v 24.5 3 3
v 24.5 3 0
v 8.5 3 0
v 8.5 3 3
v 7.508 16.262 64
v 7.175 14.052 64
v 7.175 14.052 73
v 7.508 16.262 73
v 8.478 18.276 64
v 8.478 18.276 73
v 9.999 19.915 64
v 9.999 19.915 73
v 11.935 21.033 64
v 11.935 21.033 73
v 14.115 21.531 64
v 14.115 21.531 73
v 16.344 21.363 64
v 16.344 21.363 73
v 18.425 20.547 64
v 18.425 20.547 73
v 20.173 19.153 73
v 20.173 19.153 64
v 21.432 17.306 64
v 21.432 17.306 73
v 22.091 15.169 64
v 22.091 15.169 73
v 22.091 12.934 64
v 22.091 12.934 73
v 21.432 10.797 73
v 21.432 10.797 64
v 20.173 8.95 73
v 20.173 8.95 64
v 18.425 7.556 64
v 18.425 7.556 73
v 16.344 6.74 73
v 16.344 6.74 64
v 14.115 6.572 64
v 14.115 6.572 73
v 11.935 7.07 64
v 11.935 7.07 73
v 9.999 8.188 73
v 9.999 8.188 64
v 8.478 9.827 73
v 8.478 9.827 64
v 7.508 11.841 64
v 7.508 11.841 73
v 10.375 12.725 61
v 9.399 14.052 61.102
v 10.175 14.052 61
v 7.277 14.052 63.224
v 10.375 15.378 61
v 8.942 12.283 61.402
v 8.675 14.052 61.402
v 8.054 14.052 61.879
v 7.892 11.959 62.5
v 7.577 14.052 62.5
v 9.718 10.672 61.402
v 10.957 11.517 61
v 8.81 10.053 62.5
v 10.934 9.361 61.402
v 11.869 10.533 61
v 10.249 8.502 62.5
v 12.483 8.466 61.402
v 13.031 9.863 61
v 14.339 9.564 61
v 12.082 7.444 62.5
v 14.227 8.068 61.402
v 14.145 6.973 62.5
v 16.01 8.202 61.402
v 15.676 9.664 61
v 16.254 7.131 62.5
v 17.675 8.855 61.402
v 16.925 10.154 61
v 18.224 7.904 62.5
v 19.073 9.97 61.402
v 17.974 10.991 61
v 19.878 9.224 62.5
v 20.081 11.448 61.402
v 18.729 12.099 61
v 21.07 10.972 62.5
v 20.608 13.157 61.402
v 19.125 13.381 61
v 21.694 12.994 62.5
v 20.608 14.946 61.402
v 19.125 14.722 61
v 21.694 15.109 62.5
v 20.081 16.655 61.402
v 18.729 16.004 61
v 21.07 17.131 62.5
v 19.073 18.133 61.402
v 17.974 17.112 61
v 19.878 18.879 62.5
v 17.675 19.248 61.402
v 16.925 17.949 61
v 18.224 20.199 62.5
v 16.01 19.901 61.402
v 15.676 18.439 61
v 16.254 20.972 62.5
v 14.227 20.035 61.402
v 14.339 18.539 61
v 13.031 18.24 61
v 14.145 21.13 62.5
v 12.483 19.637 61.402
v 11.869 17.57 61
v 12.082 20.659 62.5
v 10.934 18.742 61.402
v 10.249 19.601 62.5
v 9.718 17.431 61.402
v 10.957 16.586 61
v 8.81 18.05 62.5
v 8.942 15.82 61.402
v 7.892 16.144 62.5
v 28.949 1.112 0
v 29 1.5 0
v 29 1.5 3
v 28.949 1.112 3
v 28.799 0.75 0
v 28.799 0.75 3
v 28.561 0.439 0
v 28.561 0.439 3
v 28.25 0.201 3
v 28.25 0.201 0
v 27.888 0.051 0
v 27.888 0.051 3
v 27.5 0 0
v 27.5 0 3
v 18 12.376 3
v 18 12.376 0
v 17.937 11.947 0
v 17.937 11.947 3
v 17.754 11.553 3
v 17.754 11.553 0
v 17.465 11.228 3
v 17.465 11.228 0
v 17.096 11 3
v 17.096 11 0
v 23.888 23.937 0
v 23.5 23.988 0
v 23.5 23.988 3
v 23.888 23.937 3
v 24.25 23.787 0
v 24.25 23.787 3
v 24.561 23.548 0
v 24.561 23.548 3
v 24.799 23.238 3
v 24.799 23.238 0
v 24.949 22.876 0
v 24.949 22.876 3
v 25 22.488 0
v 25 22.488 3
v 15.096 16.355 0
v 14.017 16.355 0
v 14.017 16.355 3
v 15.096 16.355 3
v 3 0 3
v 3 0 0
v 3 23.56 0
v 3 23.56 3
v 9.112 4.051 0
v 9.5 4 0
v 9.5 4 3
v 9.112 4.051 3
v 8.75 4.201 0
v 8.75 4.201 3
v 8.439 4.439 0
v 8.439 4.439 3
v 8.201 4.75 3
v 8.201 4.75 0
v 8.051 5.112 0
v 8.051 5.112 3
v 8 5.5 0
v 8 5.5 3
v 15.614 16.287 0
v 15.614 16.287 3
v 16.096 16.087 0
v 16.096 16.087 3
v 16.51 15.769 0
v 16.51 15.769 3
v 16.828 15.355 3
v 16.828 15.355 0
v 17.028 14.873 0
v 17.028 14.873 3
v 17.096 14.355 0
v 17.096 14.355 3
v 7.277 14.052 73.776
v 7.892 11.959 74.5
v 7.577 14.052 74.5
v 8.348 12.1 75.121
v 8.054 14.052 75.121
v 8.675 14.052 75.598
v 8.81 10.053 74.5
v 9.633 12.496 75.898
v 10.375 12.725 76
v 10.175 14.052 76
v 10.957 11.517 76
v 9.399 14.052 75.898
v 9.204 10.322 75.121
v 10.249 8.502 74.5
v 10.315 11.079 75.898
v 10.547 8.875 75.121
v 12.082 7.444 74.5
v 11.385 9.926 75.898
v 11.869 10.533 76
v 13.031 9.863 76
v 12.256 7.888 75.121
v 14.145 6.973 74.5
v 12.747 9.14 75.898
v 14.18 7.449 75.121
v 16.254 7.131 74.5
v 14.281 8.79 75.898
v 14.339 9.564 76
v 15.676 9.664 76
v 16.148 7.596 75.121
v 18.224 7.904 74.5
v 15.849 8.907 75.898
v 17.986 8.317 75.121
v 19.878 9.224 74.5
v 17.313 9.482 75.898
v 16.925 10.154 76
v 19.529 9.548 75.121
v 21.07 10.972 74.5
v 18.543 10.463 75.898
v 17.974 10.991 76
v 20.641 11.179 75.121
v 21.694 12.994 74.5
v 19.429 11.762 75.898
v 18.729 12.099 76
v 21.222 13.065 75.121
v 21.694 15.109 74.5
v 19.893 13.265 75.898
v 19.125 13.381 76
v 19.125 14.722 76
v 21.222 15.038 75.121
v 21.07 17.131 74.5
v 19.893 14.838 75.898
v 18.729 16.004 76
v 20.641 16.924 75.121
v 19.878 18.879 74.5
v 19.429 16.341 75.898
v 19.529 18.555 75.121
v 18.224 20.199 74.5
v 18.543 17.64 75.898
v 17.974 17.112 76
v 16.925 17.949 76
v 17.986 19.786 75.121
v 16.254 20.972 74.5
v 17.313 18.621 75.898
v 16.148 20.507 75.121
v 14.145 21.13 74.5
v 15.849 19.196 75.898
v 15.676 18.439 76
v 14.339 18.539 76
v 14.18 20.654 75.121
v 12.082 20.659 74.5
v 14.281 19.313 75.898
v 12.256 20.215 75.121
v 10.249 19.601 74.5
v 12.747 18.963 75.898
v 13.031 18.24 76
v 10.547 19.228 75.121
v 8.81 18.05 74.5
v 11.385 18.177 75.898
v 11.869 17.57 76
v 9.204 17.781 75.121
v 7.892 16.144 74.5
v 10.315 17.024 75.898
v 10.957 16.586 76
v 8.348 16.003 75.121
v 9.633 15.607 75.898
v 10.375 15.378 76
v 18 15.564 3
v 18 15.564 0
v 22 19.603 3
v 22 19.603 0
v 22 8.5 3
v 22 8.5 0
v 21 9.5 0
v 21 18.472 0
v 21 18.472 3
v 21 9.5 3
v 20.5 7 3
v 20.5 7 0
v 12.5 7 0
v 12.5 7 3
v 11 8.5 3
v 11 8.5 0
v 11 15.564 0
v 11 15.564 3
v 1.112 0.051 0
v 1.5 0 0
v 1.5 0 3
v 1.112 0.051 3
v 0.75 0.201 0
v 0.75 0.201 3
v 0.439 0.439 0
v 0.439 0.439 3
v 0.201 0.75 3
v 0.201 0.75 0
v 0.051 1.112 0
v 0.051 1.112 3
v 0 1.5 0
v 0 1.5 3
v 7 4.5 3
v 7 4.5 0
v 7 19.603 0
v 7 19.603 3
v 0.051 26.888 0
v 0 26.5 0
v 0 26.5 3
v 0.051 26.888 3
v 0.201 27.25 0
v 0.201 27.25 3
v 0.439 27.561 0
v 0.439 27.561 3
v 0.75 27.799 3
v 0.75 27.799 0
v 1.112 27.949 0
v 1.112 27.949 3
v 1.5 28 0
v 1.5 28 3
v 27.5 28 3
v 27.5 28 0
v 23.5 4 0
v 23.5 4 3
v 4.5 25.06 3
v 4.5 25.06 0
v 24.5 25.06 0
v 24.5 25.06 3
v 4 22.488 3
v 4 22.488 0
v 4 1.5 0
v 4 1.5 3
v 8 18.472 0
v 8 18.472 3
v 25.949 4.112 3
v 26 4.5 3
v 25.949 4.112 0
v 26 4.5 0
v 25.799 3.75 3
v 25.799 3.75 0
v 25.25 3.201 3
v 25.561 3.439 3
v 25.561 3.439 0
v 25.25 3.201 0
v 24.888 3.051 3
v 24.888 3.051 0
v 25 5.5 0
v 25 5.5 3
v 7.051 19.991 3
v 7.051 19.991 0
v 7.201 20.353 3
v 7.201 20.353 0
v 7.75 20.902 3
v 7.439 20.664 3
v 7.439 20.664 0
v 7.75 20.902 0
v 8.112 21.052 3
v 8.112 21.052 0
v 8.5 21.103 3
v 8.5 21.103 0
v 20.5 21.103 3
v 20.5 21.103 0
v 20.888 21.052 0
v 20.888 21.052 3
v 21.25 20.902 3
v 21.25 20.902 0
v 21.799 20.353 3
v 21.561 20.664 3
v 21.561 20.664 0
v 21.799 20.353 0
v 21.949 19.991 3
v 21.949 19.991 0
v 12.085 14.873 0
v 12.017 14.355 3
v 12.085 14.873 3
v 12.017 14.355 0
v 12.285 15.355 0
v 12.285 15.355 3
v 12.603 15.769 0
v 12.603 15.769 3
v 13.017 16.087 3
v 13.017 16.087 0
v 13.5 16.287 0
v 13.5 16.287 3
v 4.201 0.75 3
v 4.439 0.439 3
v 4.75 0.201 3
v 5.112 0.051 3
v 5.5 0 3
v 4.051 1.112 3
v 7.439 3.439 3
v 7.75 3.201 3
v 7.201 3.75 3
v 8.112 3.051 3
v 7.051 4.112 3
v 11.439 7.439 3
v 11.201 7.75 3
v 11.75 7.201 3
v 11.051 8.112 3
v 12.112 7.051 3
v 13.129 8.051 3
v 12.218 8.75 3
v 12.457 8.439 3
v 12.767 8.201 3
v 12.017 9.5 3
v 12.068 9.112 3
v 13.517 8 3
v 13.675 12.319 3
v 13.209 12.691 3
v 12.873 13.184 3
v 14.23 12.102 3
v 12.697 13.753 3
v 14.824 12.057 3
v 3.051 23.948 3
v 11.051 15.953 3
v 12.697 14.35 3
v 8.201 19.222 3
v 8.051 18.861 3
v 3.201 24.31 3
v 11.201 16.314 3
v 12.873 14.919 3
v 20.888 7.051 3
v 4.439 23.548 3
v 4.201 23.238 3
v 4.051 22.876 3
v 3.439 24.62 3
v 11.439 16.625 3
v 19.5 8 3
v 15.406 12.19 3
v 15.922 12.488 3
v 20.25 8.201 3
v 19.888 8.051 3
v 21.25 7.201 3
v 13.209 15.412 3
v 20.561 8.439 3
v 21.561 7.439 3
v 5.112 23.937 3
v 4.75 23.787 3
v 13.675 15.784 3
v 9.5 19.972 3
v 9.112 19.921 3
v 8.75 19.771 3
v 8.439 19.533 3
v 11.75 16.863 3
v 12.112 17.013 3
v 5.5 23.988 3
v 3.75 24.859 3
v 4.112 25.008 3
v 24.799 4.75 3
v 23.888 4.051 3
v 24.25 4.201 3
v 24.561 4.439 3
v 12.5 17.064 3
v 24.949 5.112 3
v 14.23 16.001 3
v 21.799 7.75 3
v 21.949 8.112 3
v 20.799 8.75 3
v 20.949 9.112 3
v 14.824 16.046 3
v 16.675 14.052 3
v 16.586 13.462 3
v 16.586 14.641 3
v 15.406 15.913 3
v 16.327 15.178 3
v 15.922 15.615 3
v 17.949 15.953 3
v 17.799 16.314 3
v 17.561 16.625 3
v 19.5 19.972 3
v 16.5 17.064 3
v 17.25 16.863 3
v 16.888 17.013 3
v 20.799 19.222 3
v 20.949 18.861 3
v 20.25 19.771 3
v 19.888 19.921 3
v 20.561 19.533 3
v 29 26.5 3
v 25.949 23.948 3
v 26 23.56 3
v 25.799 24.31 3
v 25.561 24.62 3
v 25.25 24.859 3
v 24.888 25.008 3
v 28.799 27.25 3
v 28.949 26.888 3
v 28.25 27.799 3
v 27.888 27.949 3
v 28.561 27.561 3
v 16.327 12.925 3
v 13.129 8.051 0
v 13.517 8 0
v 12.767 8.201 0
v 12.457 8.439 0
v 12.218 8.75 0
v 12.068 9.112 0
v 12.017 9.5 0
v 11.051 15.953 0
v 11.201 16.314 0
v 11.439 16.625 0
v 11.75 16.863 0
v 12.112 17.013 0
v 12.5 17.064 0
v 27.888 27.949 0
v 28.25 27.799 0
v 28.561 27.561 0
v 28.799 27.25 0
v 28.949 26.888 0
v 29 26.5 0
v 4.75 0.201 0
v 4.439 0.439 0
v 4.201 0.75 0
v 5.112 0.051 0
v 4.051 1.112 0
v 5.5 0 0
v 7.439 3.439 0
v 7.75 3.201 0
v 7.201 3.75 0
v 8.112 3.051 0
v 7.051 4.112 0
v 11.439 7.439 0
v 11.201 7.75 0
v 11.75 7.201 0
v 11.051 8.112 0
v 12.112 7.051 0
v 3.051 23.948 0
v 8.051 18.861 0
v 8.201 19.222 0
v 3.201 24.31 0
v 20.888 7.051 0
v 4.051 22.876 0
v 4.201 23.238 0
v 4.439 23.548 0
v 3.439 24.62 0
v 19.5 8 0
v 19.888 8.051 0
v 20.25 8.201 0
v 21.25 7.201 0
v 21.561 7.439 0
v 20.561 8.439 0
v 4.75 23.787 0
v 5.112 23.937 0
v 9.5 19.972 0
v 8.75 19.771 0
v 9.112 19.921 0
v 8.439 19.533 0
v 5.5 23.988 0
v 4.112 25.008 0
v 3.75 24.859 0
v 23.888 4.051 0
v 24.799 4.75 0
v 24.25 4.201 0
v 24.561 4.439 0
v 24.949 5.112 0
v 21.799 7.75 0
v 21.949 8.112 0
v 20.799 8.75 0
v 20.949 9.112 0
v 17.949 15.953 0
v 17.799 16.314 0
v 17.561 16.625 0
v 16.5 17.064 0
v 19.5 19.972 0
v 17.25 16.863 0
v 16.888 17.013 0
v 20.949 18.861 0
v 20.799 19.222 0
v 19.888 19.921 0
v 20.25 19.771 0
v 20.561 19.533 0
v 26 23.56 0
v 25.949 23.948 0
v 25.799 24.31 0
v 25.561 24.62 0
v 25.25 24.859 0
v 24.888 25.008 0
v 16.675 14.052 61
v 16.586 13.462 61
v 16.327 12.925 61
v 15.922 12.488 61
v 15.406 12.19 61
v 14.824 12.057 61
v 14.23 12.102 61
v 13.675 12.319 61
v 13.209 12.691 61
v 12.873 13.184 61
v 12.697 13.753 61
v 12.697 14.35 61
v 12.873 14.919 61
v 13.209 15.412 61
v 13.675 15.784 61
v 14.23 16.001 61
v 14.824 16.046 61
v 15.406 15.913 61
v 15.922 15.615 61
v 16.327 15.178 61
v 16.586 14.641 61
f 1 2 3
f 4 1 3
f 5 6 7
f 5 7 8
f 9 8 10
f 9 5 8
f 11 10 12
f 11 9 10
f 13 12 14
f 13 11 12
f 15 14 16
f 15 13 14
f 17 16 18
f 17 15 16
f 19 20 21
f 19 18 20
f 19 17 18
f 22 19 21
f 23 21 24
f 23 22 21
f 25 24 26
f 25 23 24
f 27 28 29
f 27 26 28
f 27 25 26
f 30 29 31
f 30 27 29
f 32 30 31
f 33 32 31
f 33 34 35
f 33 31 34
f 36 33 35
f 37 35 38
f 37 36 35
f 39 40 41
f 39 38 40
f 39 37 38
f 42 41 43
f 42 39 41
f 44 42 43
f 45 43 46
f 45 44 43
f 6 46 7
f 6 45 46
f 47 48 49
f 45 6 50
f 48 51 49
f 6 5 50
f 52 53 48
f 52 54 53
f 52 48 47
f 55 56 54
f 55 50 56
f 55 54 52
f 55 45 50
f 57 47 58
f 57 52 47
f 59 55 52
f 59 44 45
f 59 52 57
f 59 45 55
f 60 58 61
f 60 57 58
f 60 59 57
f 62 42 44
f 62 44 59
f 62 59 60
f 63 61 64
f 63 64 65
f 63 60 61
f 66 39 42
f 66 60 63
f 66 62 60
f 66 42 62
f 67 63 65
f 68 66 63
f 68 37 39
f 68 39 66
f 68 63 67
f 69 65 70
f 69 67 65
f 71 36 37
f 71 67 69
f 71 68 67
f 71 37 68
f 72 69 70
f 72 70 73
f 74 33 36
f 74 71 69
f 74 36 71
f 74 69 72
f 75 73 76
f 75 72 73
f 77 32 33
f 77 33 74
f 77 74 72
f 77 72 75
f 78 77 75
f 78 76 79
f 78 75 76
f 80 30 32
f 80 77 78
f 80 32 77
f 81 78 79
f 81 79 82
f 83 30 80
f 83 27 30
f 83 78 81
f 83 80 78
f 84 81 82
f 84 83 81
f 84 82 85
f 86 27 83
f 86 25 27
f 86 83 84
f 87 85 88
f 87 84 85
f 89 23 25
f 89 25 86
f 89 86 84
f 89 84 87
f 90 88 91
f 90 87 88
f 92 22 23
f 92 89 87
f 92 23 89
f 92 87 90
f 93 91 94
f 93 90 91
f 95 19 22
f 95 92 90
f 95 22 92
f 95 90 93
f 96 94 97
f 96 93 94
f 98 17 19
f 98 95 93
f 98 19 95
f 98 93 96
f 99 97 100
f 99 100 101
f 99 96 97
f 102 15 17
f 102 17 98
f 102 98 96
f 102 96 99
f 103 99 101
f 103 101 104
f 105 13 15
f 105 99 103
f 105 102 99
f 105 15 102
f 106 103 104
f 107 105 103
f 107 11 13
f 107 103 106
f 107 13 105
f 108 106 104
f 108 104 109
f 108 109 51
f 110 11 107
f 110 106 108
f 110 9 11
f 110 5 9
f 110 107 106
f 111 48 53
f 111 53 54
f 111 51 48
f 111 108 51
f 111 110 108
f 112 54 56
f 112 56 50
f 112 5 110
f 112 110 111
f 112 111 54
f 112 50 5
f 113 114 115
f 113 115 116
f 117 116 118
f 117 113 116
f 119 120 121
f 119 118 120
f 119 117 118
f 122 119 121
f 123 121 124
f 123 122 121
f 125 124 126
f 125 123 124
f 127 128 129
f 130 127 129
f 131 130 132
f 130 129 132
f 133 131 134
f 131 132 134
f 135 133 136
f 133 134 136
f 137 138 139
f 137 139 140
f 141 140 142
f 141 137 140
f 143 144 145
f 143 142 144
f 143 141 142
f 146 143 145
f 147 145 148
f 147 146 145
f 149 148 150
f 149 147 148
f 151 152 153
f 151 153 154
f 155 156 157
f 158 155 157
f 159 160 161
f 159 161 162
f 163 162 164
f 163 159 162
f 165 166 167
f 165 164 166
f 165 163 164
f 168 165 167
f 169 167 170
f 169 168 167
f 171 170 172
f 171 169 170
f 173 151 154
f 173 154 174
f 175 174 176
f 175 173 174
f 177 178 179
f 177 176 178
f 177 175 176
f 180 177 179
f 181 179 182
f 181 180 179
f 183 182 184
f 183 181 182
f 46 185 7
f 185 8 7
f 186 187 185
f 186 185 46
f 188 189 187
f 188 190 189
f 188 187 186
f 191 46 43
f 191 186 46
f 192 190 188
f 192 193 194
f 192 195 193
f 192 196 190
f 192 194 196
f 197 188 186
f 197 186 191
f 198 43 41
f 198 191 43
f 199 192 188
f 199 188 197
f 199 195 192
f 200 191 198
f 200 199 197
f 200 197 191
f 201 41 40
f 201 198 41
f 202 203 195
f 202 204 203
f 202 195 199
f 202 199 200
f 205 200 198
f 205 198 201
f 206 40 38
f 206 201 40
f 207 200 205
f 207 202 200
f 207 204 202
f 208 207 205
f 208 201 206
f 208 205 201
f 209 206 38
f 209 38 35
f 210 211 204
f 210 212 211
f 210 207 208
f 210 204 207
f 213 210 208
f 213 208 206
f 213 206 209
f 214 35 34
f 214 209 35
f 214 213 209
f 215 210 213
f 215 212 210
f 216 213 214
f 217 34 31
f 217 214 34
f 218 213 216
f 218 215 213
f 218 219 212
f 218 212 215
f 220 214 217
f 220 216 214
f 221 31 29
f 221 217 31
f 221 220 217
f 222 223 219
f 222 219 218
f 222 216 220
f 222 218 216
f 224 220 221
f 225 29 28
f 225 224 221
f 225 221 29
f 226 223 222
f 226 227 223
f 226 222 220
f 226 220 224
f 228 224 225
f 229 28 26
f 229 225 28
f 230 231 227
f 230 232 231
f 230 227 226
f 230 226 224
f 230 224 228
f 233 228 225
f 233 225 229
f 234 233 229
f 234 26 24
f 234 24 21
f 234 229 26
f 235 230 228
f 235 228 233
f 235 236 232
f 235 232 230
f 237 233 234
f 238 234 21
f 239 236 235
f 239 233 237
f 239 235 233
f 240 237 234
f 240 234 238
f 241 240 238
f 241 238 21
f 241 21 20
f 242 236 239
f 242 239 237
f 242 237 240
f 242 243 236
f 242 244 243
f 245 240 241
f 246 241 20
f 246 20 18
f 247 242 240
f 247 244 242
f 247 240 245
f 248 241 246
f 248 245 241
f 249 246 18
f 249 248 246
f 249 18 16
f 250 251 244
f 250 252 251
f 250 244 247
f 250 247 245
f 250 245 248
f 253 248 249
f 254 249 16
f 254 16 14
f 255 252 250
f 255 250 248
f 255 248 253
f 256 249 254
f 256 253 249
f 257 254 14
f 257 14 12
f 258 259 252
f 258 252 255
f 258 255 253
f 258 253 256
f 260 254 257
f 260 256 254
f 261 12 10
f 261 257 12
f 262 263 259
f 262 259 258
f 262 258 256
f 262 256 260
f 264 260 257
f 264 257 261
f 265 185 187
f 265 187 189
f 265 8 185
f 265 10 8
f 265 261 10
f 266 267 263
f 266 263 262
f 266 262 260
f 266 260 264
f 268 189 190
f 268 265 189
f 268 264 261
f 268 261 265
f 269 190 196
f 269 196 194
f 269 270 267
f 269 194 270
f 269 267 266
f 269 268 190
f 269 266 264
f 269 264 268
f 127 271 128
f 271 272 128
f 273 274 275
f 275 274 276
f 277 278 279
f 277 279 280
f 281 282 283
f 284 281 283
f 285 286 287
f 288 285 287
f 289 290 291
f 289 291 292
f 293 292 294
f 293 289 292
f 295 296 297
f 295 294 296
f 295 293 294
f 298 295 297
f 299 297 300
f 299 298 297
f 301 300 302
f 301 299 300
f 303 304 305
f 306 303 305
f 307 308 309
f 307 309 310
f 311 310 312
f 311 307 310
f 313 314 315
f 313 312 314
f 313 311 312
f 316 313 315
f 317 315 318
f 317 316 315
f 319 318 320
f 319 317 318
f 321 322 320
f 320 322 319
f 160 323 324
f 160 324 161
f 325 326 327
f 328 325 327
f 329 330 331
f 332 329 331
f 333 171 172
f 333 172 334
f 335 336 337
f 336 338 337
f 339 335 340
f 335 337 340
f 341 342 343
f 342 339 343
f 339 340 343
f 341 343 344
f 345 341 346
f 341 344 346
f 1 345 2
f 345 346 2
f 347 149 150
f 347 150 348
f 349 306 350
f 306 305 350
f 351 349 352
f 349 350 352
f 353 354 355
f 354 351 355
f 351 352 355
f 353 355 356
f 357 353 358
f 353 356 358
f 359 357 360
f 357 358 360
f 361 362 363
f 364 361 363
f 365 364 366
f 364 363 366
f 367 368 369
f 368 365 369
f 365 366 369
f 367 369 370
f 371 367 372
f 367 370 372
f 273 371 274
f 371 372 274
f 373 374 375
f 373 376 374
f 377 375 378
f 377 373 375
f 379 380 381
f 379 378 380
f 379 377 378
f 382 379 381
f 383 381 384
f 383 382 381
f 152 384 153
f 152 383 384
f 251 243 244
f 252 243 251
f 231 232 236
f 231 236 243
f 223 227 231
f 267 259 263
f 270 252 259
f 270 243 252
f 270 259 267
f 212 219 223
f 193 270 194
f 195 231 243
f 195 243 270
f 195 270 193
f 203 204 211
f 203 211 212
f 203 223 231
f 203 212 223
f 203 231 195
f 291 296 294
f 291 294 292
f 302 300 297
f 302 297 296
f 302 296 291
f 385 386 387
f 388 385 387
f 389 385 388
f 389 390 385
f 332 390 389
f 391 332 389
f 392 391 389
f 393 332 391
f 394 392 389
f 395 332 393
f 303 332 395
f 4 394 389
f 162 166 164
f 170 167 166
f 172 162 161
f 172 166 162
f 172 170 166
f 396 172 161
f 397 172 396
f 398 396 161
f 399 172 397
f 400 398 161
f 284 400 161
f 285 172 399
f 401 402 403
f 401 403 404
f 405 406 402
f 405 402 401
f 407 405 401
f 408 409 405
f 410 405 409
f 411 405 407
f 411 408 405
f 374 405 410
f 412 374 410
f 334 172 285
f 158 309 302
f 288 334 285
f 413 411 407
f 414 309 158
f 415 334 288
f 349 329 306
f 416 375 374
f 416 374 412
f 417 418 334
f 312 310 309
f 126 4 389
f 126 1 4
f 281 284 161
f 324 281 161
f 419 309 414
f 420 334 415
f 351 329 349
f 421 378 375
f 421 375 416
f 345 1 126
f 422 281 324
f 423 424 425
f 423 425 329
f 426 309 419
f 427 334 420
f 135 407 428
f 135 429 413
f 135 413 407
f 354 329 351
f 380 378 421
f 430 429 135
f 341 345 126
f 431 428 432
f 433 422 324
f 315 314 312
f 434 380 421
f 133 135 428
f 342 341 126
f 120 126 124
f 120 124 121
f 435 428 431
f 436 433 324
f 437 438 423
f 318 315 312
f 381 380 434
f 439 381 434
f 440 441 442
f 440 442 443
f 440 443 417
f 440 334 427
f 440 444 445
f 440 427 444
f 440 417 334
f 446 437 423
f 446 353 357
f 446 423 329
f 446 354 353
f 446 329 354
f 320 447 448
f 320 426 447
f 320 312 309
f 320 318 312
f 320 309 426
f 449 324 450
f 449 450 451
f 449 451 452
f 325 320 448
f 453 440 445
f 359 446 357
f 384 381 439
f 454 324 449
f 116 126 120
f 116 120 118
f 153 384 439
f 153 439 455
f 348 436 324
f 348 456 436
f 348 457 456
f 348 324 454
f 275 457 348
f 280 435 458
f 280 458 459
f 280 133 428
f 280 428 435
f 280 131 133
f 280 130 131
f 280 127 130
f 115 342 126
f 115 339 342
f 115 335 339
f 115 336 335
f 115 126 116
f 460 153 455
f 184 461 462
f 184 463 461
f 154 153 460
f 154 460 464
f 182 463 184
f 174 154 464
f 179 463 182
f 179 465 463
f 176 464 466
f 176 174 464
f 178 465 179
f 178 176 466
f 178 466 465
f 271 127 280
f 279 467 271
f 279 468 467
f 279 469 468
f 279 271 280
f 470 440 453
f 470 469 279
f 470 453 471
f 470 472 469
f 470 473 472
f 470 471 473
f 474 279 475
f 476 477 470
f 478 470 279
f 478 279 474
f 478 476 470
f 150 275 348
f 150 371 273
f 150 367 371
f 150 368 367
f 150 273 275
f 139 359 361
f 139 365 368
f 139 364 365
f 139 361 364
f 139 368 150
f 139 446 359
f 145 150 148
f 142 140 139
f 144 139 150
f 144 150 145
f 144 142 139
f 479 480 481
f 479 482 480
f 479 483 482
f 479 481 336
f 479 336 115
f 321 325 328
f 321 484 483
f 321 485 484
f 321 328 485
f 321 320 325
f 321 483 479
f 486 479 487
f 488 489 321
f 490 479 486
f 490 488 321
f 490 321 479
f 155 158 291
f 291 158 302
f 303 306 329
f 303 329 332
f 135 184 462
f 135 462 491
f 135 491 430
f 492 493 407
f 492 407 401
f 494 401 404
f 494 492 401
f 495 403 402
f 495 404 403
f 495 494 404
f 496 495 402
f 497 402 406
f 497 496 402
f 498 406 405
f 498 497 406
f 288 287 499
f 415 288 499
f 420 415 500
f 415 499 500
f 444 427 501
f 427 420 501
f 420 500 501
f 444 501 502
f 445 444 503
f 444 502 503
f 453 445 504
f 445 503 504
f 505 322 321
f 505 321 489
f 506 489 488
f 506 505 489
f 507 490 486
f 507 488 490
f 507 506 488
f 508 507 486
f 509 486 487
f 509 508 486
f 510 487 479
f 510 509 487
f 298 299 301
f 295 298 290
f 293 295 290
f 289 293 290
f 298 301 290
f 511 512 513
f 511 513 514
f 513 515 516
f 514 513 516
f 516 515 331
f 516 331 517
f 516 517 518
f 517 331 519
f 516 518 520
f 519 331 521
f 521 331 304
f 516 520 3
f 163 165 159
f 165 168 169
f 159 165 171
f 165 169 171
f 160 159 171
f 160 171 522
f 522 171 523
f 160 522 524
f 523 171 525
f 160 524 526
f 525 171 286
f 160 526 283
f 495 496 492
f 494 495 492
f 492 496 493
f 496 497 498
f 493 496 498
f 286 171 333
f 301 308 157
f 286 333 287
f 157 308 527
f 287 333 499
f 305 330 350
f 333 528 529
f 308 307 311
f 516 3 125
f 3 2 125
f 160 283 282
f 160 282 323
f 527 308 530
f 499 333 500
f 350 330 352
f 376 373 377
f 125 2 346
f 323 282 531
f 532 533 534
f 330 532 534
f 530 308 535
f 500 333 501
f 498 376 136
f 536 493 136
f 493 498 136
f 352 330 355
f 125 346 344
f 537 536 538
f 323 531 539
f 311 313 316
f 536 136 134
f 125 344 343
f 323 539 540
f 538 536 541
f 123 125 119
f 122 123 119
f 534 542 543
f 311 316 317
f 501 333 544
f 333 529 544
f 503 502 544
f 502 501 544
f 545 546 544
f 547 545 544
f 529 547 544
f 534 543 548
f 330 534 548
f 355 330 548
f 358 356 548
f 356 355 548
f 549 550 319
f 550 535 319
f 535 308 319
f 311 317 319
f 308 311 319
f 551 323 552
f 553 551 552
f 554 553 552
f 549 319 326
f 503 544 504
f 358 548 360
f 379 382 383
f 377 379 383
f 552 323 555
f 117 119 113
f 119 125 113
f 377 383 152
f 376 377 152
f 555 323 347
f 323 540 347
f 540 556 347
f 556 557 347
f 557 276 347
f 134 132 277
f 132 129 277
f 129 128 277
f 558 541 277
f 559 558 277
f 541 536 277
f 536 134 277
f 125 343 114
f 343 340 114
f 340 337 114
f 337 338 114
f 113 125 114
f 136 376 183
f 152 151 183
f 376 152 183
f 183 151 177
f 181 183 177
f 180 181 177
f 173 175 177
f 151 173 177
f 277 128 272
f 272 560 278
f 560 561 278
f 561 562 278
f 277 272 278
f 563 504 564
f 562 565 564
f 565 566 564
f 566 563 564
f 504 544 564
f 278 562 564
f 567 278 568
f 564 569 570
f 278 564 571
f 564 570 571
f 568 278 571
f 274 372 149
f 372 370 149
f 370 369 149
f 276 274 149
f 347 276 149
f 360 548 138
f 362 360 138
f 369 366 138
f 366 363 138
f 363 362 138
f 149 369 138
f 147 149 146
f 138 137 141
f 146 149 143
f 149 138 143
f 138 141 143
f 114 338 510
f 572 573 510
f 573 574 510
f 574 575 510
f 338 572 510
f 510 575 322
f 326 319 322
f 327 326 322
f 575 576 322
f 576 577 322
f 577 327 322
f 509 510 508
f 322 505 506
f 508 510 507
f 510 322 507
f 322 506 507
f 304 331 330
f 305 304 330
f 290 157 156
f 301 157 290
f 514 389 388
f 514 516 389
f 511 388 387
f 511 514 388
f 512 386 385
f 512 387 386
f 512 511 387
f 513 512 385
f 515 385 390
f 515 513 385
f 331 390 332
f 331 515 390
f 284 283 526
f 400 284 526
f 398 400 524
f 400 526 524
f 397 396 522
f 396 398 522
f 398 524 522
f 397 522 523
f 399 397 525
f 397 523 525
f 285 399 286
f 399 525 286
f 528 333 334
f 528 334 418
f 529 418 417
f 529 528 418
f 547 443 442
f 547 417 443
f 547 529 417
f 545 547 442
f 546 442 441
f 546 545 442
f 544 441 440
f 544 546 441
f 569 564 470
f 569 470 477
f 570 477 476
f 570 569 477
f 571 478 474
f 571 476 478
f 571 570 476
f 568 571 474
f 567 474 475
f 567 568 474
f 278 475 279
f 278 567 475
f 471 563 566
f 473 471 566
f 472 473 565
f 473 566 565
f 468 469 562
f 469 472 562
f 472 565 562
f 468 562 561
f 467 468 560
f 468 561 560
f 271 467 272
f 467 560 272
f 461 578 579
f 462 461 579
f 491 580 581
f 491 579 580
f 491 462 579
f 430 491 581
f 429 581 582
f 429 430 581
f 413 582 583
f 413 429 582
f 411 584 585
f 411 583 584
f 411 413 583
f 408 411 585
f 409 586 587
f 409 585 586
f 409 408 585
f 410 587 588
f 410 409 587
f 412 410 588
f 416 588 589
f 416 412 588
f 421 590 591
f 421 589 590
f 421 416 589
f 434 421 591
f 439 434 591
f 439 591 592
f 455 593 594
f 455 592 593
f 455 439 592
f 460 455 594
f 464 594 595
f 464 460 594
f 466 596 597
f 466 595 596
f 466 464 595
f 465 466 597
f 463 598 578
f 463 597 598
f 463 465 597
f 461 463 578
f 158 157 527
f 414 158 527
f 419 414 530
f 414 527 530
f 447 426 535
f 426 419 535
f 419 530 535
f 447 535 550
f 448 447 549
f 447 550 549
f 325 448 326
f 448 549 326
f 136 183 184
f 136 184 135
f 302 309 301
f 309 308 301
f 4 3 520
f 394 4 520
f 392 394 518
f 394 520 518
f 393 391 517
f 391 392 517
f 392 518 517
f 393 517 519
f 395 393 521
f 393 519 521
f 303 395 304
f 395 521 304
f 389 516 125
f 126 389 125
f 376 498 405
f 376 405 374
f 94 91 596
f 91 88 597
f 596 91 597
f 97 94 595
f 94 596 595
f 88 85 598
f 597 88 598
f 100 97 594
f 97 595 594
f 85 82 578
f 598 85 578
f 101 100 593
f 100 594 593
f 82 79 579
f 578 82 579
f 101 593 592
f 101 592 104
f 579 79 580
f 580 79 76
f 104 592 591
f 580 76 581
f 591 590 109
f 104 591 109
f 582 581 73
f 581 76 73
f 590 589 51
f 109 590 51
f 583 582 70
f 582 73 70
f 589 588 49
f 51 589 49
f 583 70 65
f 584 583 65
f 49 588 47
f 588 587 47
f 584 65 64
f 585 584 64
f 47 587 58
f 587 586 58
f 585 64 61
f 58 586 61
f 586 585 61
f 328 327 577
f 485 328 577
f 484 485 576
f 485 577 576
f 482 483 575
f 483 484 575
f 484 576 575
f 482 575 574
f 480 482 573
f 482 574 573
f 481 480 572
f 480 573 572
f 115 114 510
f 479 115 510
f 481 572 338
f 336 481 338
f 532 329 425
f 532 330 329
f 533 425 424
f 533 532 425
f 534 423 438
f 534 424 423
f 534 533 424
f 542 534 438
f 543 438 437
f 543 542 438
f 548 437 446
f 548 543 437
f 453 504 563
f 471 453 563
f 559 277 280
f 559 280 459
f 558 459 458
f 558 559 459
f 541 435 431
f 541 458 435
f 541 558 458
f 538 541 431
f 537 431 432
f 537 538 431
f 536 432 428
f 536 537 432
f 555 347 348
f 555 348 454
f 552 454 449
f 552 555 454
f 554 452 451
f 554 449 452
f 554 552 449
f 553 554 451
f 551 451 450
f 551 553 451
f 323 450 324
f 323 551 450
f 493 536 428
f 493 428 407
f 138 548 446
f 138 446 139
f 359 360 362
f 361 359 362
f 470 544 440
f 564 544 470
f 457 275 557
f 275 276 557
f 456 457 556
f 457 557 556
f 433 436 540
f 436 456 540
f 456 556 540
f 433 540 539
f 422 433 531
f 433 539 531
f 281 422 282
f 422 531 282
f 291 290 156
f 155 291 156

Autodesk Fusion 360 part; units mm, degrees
sketch "Sketch1" plane through (0, 0, 0) normal (0, 0, 1) x (1, 0, 0)
  line L0 (29, 1.5) -> (29, 26.5)
  line L1 (27.5, 28) -> (1.5, 28)
  line L2 (0, 26.5) -> (0, 1.5)
  line L3 (3, 0) -> (3, 23.5595)
  line L4 (4.5, 25.0595) -> (24.5, 25.0595)
  line L5 (26, 23.5595) -> (26, 4.5)
  line L6 (24.5, 3) -> (8.5, 3)
  line L7 (4, 3) -> (4, 1.5)
  line L8 (4, 3) -> (4, 22.4878)
  line L9 (5.5, 23.9878) -> (23.5, 23.9878)
  line L10 (25, 22.4878) -> (25, 5.5)
  line L11 (23.5, 4) -> (9.5, 4)
  line L12 (8, 5.5) -> (8, 18.4723)
  line L13 (9.5, 19.9723) -> (19.5, 19.9723)
  line L14 (21, 18.4723) -> (21, 9.5)
  line L15 (19.5, 8) -> (13.5173, 8)
  line L16 (12.0173, 9.5) -> (12.0173, 14.3549)
  line L17 (14.0173, 16.3549) -> (15.0961, 16.3549)
  line L18 (17.0961, 14.3549) -> (17.0961, 11)
  line L19 (7, 4.5) -> (7, 19.6029)
  line L20 (8.5, 21.1029) -> (20.5, 21.1029)
  line L21 (22, 19.6029) -> (22, 8.5)
  line L22 (20.5, 7) -> (12.5, 7)
  line L23 (11, 8.5) -> (11, 15.5643)
  line L24 (12.5, 17.0643) -> (16.5, 17.0643)
  line L25 (18, 15.5643) -> (18, 12.3765)
  line L26 (1.5, 0) -> (3, 0)
  line L27 (5.5, 0) -> (27.5, 0)
  circle A0 centre (14.675, 14.0515) radius 2
  arc A1 (1.5, 28) -> (0, 26.5) centre (1.5, 26.5) ccw
  arc A2 (0, 1.5) -> (1.5, 0) centre (1.5, 1.5) ccw
  arc A3 (4.5, 25.0595) -> (3, 23.5595) centre (4.5, 23.5595) ccw
  arc A4 (26, 23.5595) -> (24.5, 25.0595) centre (24.5, 23.5595) ccw
  arc A5 (29, 26.5) -> (27.5, 28) centre (27.5, 26.5) ccw
  arc A6 (27.5, 0) -> (29, 1.5) centre (27.5, 1.5) ccw
  arc A7 (4, 1.5) -> (5.5, 0) centre (5.5, 1.5) ccw
  arc A8 (5.5, 23.9878) -> (4, 22.4878) centre (5.5, 22.4878) ccw
  arc A9 (25, 22.4878) -> (23.5, 23.9878) centre (23.5, 22.4878) ccw
  arc A10 (23.5, 4) -> (25, 5.5) centre (23.5, 5.5) ccw
  arc A11 (24.5, 3) -> (26, 4.5) centre (24.5, 4.5) ccw
  arc A12 (7, 4.5) -> (8.5, 3) centre (8.5, 4.5) ccw
  arc A13 (8, 5.5) -> (9.5, 4) centre (9.5, 5.5) ccw
  arc A14 (9.5, 19.9723) -> (8, 18.4723) centre (9.5, 18.4723) ccw
  arc A15 (8.5, 21.1029) -> (7, 19.6029) centre (8.5, 19.6029) ccw
  arc A16 (22, 19.6029) -> (20.5, 21.1029) centre (20.5, 19.6029) ccw
  arc A17 (21, 18.4723) -> (19.5, 19.9723) centre (19.5, 18.4723) ccw
  arc A18 (20.5, 7) -> (22, 8.5) centre (20.5, 8.5) ccw
  arc A19 (19.5, 8) -> (21, 9.5) centre (19.5, 9.5) ccw
  arc A20 (11, 8.5) -> (12.5, 7) centre (12.5, 8.5) ccw
  arc A21 (12.5, 17.0643) -> (11, 15.5643) centre (12.5, 15.5643) ccw
  arc A22 (18, 15.5643) -> (16.5, 17.0643) centre (16.5, 15.5643) ccw
  arc A23 (17.0961, 11) -> (18, 12.3765) centre (16.5, 12.3765) ccw
  arc A24 (14.0173, 16.3549) -> (12.0173, 14.3549) centre (14.0173, 14.3549) ccw
  arc A25 (17.0961, 14.3549) -> (15.0961, 16.3549) centre (15.0961, 14.3549) ccw
  arc A26 (12.0173, 9.5) -> (13.5173, 8) centre (13.5173, 9.5) ccw
  point P0 (29, 0)
  point P1 (0, 28)
  dimension "d1" = 29
  dimension "d2" = 28
  dimension "d3" = 4
  dimension "d4" = 1.5
  dimension "d5" = 2
  dimension "d15" = 1.5
extrude "Extrude1" add sketch "Sketch1" along normal blind 3
extrude "Extrude2" add sketch "Sketch1" along normal blind 61 contours A0
sketch "Sketch2" plane through (0, 0, 61) normal (0, 0, 1) x (-1, 0, 0)
  circle A0 centre (-14.675, -14.0515) radius 2
  circle A1 centre (-14.675, -14.0515) radius 7.5
  dimension "d10" = 15
extrude "Extrude3" add sketch "Sketch2" along normal blind 15 contours A0 | A1
fillet "Fillet1" radius 3 2 edges at (21.6674, 16.7636, 76) (21.6674, 16.7636, 61)
equation "d8 = 36 mm + 25 mm"
